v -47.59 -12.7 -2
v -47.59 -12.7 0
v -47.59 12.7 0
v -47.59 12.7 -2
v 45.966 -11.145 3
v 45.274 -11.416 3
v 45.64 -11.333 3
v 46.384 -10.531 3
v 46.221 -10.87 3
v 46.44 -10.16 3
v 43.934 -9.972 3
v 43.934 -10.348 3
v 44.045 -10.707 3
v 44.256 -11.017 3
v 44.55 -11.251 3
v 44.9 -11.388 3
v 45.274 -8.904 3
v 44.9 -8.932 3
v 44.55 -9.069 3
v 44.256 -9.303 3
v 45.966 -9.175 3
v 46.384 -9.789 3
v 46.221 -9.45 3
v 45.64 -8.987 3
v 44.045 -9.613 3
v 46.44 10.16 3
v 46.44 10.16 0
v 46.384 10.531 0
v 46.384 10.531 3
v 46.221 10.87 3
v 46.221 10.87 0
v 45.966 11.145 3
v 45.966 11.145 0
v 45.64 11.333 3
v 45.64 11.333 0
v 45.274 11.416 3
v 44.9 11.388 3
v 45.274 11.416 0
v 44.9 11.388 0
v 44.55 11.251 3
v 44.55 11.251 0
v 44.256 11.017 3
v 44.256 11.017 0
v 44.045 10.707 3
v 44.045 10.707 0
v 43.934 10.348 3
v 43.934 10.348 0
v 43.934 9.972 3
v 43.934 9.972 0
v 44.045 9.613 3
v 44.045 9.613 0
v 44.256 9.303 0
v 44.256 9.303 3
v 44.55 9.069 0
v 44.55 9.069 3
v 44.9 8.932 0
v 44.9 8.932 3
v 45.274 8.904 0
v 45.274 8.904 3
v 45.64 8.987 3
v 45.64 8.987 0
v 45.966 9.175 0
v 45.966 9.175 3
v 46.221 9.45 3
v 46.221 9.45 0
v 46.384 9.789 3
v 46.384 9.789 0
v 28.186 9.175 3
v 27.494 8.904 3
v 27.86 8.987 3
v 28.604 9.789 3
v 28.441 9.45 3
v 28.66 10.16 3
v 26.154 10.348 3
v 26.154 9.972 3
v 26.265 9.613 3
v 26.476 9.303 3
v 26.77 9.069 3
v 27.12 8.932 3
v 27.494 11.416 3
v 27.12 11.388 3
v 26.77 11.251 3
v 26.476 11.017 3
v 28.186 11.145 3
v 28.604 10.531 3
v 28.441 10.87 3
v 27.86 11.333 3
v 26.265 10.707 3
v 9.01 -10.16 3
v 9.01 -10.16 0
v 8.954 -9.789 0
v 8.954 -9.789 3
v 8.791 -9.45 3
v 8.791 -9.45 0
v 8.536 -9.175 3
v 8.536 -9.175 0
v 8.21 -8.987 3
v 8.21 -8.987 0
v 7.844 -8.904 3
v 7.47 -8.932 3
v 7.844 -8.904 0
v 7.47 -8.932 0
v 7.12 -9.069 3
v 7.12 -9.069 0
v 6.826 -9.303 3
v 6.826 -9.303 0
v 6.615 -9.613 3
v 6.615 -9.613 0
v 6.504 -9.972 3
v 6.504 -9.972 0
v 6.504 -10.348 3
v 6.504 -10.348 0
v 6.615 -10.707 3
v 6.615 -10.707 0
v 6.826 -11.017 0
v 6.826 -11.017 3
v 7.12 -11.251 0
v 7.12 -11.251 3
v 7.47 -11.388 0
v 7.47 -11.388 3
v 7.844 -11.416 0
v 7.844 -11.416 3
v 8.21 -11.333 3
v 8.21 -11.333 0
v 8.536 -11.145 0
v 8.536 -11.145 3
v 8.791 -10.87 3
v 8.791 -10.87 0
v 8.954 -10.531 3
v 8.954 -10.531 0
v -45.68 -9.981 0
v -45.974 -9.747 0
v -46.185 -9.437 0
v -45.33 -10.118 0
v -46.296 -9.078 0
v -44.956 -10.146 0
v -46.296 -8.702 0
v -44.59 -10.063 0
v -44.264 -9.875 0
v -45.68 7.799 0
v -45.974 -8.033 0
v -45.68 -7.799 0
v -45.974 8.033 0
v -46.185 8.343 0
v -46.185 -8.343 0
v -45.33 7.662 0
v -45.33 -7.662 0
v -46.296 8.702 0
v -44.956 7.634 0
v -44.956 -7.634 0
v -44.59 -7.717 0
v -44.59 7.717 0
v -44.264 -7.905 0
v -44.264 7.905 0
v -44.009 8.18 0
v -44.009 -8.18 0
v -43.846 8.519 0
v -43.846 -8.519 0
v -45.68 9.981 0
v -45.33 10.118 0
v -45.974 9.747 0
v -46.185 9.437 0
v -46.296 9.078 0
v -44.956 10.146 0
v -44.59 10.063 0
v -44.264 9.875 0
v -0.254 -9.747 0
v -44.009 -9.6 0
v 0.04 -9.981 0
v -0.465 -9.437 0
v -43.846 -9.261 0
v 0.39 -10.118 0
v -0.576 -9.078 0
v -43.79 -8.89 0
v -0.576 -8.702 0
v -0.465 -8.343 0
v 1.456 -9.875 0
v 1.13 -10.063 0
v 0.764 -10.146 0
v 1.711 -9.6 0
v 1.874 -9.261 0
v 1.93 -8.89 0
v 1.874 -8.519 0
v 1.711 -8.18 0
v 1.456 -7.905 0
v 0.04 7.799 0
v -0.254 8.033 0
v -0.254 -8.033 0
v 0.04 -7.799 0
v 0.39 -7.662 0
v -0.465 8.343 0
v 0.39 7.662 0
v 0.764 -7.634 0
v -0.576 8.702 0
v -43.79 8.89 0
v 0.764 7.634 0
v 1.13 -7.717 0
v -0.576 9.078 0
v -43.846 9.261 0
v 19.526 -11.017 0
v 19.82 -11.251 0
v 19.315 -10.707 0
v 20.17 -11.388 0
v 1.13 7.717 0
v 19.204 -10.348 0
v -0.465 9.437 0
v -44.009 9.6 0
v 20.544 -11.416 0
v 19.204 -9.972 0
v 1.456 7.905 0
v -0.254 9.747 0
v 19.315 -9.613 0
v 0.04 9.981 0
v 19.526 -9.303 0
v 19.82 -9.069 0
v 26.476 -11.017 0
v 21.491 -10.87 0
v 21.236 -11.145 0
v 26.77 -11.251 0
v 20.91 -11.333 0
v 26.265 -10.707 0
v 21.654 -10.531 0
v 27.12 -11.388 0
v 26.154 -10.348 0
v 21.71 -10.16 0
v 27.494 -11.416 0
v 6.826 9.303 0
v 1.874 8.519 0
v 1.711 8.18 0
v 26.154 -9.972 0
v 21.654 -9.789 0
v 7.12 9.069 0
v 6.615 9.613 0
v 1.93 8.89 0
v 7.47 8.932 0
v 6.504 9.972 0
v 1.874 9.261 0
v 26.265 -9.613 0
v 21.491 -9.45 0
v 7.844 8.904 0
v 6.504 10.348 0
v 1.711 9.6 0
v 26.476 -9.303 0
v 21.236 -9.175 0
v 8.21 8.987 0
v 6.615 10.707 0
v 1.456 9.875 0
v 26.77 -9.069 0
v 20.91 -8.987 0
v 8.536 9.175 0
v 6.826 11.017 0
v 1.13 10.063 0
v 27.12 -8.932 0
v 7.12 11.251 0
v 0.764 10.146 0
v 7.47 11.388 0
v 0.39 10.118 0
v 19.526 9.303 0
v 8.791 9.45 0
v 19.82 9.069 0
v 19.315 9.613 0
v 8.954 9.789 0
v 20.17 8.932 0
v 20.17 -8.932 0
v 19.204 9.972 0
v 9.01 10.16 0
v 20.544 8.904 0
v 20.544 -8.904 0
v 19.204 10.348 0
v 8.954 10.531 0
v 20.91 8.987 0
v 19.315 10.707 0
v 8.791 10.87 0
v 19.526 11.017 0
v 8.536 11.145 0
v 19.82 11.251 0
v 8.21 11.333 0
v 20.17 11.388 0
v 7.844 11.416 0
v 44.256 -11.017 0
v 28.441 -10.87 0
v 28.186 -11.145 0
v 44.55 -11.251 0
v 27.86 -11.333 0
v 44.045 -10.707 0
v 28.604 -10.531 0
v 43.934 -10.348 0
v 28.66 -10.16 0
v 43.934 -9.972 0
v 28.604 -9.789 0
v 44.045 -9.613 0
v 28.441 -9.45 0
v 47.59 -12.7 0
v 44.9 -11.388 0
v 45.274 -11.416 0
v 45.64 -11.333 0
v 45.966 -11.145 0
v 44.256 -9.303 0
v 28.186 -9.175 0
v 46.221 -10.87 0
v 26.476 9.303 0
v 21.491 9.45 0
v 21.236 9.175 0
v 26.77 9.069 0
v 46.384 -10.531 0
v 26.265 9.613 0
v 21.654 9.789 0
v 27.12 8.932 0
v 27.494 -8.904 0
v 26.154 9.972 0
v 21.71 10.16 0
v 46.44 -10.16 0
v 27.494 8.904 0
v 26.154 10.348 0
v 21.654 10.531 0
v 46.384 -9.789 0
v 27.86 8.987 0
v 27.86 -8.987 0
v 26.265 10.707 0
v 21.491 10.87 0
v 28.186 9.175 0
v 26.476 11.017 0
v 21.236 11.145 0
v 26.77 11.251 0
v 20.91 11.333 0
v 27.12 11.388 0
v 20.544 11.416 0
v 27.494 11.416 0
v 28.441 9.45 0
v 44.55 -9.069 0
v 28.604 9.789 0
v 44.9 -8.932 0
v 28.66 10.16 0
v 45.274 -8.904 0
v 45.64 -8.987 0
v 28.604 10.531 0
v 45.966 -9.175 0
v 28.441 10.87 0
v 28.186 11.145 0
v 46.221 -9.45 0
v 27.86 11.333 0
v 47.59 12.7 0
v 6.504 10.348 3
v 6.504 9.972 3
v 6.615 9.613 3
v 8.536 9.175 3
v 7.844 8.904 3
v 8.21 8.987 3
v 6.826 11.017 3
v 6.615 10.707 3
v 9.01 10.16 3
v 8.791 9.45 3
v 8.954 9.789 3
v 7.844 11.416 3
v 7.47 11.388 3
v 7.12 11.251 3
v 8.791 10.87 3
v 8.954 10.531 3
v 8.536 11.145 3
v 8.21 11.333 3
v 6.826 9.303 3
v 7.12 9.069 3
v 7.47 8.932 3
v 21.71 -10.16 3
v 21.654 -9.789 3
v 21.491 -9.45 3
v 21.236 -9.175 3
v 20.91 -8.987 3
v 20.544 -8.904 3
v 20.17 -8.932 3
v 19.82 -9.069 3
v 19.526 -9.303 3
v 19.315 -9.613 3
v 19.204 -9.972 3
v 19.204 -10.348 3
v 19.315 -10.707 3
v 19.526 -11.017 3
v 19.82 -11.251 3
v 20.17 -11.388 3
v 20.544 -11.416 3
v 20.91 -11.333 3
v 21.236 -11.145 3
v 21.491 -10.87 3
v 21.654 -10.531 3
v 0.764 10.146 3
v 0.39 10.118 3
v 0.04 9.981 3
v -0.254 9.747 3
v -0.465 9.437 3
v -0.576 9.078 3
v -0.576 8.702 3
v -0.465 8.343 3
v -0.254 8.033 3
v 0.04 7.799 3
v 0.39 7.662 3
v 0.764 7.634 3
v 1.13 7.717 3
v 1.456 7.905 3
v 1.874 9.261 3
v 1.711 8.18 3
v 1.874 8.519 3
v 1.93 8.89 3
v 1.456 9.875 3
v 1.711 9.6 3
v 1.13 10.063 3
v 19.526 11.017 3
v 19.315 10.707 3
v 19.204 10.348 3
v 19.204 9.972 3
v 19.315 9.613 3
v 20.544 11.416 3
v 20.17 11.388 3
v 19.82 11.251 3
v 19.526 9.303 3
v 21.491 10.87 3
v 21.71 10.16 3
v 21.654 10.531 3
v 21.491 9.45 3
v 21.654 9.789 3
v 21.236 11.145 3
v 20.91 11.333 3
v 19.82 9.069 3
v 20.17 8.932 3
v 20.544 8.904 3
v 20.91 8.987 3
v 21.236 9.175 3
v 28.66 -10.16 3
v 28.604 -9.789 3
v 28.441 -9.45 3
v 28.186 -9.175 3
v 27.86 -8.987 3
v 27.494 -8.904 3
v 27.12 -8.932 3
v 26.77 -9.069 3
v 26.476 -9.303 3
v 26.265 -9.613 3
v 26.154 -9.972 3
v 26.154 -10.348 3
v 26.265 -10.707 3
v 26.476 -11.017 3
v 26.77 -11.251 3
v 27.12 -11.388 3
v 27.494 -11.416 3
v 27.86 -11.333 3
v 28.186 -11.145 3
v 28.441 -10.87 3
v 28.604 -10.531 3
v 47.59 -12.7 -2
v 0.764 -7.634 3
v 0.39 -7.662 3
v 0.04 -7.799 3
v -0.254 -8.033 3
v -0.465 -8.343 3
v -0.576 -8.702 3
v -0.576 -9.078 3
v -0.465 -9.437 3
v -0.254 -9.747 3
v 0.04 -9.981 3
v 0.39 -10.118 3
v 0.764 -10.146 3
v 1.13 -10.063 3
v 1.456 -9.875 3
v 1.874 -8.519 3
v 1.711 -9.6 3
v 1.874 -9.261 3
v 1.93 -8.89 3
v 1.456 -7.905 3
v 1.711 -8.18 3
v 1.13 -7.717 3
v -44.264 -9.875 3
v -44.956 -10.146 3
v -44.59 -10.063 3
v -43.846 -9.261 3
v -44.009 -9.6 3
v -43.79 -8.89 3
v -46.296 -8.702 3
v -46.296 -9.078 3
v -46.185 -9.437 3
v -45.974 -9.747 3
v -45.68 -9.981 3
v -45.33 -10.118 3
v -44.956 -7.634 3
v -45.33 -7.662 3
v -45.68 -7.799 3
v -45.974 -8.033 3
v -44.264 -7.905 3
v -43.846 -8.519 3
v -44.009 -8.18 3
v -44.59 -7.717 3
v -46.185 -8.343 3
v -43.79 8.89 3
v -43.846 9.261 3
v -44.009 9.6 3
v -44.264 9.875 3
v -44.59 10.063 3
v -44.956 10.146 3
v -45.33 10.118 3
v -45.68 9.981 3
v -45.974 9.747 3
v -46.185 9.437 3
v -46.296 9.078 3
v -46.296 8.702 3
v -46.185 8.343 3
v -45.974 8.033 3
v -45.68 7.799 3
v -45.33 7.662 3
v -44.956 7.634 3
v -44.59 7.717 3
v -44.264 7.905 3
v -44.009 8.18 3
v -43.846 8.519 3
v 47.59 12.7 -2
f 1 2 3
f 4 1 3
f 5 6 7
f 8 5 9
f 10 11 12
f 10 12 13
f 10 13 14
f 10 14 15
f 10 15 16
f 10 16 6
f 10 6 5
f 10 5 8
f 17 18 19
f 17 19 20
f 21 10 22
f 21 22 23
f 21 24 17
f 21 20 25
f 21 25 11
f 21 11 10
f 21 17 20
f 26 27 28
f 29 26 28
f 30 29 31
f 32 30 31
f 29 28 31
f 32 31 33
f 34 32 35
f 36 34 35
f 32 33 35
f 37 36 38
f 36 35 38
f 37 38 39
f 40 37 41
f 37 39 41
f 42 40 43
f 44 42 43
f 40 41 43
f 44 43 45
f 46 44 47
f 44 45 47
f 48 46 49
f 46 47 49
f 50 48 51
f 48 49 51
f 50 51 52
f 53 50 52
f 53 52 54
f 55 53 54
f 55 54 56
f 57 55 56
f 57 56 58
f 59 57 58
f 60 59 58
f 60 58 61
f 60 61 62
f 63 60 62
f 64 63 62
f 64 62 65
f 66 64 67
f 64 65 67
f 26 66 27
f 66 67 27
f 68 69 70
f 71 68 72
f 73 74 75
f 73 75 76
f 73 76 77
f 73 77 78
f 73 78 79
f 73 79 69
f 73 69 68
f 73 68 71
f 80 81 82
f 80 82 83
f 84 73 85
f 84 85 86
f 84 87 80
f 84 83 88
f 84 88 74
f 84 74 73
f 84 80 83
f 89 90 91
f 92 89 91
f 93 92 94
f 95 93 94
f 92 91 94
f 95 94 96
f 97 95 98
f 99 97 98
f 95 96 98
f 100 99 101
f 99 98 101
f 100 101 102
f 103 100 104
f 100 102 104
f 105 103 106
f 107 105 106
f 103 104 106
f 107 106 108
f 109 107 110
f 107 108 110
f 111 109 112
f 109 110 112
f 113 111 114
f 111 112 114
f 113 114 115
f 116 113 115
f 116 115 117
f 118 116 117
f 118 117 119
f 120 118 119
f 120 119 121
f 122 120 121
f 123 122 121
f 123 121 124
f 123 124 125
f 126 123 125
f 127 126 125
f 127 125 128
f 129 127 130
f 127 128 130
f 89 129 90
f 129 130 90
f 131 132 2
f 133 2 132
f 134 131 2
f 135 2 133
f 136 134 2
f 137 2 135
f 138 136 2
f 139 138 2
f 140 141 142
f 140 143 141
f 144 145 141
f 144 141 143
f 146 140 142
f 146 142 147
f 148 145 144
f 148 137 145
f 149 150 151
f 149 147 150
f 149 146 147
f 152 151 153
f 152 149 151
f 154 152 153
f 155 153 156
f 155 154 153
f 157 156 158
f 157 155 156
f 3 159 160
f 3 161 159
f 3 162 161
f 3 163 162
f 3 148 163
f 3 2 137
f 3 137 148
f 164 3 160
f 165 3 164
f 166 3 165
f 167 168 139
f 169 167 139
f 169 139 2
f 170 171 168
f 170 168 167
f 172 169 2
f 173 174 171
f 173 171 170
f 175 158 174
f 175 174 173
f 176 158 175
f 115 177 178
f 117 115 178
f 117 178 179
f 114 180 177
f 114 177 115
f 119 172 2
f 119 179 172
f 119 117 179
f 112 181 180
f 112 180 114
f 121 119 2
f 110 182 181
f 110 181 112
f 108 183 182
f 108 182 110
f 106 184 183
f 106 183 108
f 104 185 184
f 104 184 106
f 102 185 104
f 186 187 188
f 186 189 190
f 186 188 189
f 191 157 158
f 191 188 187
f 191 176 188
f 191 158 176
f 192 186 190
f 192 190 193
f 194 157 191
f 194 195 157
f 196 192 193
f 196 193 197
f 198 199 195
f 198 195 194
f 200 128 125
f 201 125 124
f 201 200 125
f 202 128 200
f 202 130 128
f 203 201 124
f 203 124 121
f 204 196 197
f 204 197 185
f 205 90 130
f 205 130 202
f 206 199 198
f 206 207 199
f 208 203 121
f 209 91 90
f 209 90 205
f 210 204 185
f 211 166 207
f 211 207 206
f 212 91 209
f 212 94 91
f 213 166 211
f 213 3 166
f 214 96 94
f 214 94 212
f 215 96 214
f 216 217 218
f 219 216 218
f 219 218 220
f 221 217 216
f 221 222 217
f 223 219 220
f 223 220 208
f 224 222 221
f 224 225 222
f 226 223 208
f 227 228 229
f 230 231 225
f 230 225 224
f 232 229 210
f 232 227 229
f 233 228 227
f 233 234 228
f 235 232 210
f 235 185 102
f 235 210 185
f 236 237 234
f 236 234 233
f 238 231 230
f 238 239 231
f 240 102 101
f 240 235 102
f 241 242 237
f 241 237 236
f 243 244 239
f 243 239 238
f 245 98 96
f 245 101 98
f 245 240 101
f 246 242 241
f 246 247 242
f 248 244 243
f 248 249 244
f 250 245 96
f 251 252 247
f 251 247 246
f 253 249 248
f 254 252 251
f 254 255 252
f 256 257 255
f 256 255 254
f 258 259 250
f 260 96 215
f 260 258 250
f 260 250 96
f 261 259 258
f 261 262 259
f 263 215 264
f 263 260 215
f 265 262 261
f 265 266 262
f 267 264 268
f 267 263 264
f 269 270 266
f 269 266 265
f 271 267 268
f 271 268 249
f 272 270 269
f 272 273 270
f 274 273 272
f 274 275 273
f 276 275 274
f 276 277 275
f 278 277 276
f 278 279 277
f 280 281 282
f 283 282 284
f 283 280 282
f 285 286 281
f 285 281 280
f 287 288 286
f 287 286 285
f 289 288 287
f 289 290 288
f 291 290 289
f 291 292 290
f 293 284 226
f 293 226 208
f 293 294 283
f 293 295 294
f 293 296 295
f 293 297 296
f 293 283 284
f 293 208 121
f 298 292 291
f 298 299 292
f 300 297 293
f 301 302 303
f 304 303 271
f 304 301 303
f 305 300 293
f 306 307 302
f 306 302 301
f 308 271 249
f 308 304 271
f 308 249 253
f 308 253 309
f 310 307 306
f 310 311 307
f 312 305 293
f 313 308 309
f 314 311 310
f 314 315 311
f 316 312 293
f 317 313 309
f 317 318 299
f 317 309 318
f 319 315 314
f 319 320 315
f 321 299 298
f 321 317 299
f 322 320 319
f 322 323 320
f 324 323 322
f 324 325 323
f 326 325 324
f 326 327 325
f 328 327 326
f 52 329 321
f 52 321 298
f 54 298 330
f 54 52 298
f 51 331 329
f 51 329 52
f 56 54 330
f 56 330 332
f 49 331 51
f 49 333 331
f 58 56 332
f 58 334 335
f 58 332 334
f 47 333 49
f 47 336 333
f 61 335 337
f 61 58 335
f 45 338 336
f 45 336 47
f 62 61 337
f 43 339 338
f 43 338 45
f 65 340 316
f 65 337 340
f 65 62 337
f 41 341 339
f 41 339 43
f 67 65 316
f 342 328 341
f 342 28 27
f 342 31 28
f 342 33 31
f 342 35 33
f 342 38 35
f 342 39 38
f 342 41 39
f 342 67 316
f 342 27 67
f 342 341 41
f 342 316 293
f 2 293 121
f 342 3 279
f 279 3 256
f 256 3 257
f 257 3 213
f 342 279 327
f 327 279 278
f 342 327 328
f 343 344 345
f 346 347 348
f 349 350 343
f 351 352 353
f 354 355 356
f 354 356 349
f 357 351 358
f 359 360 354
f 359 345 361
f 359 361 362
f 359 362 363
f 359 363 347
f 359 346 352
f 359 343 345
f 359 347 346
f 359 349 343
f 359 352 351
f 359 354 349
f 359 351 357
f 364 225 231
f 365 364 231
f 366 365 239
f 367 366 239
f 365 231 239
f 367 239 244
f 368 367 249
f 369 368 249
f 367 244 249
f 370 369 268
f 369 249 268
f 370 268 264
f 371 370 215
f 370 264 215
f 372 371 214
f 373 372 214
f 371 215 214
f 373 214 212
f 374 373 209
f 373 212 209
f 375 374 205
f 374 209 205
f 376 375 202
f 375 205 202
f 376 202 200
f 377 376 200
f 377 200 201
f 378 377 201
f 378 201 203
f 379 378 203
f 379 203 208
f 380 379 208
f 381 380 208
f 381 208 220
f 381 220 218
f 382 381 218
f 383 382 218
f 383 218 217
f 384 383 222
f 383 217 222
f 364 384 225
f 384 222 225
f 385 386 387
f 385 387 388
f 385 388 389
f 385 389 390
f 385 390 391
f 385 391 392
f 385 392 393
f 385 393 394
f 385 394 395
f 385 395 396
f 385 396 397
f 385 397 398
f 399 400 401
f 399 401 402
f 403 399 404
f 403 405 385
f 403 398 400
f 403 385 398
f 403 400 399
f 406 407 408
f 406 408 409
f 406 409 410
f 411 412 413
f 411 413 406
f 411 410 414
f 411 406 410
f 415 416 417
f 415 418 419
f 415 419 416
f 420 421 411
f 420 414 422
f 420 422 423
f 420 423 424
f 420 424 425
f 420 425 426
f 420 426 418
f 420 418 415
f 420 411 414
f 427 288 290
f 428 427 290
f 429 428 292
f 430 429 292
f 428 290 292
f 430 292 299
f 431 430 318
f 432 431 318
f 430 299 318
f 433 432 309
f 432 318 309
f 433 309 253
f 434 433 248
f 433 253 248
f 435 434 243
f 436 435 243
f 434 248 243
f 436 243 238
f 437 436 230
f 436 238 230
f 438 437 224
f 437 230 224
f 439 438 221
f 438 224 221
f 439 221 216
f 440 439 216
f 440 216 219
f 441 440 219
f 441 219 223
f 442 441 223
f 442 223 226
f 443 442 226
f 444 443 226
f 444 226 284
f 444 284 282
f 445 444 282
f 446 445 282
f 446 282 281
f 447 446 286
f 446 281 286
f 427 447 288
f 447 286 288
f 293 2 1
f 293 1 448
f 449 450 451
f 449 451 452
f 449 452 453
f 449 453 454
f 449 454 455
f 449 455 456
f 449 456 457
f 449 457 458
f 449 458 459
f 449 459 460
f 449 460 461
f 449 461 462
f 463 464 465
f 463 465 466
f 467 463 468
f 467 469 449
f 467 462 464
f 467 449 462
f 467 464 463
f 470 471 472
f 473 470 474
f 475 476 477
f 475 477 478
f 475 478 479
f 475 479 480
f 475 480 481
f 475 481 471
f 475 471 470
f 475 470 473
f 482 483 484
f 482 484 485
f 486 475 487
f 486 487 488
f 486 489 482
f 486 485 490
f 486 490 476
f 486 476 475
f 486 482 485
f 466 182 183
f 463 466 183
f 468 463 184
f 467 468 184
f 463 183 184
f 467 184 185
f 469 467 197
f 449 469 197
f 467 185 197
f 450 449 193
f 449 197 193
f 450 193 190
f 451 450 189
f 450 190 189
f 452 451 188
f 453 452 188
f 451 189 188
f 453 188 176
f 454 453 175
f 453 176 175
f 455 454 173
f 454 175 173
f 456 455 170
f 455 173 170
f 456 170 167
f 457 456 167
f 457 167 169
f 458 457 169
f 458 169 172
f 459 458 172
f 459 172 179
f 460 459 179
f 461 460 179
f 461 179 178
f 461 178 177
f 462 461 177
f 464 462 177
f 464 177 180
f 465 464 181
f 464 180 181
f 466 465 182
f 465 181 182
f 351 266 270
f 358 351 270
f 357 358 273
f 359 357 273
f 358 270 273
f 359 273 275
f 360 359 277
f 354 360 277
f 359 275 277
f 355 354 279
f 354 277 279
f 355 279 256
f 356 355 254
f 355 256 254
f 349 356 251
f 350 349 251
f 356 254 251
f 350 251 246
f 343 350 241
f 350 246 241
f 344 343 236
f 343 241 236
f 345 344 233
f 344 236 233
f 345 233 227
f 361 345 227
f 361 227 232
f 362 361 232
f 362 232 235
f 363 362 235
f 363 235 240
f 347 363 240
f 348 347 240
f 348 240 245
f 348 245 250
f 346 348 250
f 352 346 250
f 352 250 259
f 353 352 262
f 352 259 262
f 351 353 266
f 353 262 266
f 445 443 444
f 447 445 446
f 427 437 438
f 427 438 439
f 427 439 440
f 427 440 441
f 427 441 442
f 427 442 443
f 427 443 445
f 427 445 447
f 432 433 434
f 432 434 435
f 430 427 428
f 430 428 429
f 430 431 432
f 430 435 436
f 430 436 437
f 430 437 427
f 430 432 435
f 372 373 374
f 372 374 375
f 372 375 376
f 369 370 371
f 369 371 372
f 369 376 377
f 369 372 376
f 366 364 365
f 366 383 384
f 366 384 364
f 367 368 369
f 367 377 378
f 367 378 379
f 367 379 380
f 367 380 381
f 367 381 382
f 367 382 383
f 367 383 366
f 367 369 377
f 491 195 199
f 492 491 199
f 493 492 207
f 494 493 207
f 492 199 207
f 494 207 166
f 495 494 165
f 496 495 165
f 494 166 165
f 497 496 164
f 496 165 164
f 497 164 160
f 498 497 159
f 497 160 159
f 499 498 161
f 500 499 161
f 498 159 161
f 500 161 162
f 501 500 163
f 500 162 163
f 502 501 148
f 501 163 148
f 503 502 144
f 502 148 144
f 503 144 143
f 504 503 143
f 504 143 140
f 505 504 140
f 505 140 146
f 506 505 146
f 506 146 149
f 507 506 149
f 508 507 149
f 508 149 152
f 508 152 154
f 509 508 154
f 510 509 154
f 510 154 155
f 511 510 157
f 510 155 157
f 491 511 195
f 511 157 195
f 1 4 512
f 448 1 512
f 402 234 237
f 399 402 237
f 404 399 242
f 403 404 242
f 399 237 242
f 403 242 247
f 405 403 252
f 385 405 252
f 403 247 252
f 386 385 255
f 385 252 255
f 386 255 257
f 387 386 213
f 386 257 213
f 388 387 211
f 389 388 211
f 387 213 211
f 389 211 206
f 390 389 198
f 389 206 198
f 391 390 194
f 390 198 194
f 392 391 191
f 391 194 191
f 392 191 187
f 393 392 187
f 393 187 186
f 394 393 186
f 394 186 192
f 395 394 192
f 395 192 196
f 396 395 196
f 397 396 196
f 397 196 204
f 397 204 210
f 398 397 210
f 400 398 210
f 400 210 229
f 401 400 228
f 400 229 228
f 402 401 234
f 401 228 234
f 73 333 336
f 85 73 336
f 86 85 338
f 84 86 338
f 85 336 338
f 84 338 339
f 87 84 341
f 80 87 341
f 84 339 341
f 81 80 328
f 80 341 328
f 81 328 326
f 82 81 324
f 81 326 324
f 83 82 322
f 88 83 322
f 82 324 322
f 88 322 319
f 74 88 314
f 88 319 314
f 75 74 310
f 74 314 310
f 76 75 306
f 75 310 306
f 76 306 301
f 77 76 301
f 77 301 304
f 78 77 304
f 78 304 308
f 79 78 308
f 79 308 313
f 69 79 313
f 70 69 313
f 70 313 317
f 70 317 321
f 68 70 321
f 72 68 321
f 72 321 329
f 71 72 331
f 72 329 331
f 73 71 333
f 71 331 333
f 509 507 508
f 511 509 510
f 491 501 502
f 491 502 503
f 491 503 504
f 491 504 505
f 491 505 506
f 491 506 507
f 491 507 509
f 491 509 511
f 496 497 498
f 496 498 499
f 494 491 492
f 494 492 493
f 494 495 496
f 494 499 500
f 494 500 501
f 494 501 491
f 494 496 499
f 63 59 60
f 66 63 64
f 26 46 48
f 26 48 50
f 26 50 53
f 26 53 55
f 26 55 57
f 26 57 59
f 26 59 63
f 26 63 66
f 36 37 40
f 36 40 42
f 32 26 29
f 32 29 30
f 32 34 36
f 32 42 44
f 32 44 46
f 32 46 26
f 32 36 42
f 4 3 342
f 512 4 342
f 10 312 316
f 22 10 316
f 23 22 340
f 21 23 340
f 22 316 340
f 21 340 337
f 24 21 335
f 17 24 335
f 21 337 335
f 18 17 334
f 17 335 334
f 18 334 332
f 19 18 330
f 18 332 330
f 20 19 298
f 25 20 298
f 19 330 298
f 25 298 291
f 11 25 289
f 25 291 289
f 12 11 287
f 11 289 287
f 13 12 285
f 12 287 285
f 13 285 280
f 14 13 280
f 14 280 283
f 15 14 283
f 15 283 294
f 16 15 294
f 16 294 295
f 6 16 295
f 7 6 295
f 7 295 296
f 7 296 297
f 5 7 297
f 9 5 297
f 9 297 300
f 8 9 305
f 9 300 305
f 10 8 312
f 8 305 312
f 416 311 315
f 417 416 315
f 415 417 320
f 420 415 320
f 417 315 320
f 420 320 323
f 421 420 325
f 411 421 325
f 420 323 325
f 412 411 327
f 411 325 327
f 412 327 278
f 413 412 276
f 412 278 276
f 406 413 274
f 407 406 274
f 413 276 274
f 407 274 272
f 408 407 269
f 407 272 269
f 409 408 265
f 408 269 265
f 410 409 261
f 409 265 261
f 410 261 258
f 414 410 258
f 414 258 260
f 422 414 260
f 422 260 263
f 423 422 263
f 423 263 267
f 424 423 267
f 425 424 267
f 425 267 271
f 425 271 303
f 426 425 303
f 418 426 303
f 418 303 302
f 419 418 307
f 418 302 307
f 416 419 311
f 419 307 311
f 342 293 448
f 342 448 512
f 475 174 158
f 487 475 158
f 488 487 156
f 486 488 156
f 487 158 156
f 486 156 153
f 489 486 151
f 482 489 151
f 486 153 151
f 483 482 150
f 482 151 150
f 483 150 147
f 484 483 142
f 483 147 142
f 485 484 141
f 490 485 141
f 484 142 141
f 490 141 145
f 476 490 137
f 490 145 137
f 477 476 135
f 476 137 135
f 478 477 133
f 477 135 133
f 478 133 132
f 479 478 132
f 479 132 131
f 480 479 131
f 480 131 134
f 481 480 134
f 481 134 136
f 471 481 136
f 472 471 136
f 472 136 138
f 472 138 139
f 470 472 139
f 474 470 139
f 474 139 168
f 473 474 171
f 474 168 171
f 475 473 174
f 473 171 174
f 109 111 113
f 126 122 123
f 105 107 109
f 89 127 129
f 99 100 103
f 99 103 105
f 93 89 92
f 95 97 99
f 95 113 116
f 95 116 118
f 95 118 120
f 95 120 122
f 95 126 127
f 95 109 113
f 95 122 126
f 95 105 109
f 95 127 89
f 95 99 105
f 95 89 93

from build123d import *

# Parameters (mm, degrees)
SKETCH001_W  = 95.18
SKETCH001_H  = 25.4
PAD_DEPTH    = 2
SKETCH_R     = 1.26
PAD001_DEPTH = 3


with BuildPart() as part:
    # Sketch001 → Pad (new body)
    with BuildSketch(Plane.XY):
        Rectangle(SKETCH001_W, SKETCH001_H)
    extrude(amount=-PAD_DEPTH)

    # Sketch → Pad001 (join)
    with BuildSketch(Plane.XY):
        with Locations((-45.05, 8.89)):
            Circle(SKETCH_R)
        with Locations((0.67, 8.89)):
            Circle(SKETCH_R)
        with Locations((-45.05, -8.89)):
            Circle(SKETCH_R)
        with Locations((0.67, -8.89)):
            Circle(SKETCH_R)
        with Locations((27.4, 10.16)):
            Circle(SKETCH_R)
        with Locations((27.4, -10.16)):
            Circle(SKETCH_R)
        with Locations((45.18, 10.16)):
            Circle(SKETCH_R)
        with Locations((45.18, -10.16)):
            Circle(SKETCH_R)
        with Locations((7.75, 10.16)):
            Circle(SKETCH_R)
        with Locations((20.45, 10.16)):
            Circle(SKETCH_R)
        with Locations((7.75, -10.16)):
            Circle(SKETCH_R)
        with Locations((20.45, -10.16)):
            Circle(SKETCH_R)
    extrude(amount=PAD001_DEPTH)


solid = part.part
